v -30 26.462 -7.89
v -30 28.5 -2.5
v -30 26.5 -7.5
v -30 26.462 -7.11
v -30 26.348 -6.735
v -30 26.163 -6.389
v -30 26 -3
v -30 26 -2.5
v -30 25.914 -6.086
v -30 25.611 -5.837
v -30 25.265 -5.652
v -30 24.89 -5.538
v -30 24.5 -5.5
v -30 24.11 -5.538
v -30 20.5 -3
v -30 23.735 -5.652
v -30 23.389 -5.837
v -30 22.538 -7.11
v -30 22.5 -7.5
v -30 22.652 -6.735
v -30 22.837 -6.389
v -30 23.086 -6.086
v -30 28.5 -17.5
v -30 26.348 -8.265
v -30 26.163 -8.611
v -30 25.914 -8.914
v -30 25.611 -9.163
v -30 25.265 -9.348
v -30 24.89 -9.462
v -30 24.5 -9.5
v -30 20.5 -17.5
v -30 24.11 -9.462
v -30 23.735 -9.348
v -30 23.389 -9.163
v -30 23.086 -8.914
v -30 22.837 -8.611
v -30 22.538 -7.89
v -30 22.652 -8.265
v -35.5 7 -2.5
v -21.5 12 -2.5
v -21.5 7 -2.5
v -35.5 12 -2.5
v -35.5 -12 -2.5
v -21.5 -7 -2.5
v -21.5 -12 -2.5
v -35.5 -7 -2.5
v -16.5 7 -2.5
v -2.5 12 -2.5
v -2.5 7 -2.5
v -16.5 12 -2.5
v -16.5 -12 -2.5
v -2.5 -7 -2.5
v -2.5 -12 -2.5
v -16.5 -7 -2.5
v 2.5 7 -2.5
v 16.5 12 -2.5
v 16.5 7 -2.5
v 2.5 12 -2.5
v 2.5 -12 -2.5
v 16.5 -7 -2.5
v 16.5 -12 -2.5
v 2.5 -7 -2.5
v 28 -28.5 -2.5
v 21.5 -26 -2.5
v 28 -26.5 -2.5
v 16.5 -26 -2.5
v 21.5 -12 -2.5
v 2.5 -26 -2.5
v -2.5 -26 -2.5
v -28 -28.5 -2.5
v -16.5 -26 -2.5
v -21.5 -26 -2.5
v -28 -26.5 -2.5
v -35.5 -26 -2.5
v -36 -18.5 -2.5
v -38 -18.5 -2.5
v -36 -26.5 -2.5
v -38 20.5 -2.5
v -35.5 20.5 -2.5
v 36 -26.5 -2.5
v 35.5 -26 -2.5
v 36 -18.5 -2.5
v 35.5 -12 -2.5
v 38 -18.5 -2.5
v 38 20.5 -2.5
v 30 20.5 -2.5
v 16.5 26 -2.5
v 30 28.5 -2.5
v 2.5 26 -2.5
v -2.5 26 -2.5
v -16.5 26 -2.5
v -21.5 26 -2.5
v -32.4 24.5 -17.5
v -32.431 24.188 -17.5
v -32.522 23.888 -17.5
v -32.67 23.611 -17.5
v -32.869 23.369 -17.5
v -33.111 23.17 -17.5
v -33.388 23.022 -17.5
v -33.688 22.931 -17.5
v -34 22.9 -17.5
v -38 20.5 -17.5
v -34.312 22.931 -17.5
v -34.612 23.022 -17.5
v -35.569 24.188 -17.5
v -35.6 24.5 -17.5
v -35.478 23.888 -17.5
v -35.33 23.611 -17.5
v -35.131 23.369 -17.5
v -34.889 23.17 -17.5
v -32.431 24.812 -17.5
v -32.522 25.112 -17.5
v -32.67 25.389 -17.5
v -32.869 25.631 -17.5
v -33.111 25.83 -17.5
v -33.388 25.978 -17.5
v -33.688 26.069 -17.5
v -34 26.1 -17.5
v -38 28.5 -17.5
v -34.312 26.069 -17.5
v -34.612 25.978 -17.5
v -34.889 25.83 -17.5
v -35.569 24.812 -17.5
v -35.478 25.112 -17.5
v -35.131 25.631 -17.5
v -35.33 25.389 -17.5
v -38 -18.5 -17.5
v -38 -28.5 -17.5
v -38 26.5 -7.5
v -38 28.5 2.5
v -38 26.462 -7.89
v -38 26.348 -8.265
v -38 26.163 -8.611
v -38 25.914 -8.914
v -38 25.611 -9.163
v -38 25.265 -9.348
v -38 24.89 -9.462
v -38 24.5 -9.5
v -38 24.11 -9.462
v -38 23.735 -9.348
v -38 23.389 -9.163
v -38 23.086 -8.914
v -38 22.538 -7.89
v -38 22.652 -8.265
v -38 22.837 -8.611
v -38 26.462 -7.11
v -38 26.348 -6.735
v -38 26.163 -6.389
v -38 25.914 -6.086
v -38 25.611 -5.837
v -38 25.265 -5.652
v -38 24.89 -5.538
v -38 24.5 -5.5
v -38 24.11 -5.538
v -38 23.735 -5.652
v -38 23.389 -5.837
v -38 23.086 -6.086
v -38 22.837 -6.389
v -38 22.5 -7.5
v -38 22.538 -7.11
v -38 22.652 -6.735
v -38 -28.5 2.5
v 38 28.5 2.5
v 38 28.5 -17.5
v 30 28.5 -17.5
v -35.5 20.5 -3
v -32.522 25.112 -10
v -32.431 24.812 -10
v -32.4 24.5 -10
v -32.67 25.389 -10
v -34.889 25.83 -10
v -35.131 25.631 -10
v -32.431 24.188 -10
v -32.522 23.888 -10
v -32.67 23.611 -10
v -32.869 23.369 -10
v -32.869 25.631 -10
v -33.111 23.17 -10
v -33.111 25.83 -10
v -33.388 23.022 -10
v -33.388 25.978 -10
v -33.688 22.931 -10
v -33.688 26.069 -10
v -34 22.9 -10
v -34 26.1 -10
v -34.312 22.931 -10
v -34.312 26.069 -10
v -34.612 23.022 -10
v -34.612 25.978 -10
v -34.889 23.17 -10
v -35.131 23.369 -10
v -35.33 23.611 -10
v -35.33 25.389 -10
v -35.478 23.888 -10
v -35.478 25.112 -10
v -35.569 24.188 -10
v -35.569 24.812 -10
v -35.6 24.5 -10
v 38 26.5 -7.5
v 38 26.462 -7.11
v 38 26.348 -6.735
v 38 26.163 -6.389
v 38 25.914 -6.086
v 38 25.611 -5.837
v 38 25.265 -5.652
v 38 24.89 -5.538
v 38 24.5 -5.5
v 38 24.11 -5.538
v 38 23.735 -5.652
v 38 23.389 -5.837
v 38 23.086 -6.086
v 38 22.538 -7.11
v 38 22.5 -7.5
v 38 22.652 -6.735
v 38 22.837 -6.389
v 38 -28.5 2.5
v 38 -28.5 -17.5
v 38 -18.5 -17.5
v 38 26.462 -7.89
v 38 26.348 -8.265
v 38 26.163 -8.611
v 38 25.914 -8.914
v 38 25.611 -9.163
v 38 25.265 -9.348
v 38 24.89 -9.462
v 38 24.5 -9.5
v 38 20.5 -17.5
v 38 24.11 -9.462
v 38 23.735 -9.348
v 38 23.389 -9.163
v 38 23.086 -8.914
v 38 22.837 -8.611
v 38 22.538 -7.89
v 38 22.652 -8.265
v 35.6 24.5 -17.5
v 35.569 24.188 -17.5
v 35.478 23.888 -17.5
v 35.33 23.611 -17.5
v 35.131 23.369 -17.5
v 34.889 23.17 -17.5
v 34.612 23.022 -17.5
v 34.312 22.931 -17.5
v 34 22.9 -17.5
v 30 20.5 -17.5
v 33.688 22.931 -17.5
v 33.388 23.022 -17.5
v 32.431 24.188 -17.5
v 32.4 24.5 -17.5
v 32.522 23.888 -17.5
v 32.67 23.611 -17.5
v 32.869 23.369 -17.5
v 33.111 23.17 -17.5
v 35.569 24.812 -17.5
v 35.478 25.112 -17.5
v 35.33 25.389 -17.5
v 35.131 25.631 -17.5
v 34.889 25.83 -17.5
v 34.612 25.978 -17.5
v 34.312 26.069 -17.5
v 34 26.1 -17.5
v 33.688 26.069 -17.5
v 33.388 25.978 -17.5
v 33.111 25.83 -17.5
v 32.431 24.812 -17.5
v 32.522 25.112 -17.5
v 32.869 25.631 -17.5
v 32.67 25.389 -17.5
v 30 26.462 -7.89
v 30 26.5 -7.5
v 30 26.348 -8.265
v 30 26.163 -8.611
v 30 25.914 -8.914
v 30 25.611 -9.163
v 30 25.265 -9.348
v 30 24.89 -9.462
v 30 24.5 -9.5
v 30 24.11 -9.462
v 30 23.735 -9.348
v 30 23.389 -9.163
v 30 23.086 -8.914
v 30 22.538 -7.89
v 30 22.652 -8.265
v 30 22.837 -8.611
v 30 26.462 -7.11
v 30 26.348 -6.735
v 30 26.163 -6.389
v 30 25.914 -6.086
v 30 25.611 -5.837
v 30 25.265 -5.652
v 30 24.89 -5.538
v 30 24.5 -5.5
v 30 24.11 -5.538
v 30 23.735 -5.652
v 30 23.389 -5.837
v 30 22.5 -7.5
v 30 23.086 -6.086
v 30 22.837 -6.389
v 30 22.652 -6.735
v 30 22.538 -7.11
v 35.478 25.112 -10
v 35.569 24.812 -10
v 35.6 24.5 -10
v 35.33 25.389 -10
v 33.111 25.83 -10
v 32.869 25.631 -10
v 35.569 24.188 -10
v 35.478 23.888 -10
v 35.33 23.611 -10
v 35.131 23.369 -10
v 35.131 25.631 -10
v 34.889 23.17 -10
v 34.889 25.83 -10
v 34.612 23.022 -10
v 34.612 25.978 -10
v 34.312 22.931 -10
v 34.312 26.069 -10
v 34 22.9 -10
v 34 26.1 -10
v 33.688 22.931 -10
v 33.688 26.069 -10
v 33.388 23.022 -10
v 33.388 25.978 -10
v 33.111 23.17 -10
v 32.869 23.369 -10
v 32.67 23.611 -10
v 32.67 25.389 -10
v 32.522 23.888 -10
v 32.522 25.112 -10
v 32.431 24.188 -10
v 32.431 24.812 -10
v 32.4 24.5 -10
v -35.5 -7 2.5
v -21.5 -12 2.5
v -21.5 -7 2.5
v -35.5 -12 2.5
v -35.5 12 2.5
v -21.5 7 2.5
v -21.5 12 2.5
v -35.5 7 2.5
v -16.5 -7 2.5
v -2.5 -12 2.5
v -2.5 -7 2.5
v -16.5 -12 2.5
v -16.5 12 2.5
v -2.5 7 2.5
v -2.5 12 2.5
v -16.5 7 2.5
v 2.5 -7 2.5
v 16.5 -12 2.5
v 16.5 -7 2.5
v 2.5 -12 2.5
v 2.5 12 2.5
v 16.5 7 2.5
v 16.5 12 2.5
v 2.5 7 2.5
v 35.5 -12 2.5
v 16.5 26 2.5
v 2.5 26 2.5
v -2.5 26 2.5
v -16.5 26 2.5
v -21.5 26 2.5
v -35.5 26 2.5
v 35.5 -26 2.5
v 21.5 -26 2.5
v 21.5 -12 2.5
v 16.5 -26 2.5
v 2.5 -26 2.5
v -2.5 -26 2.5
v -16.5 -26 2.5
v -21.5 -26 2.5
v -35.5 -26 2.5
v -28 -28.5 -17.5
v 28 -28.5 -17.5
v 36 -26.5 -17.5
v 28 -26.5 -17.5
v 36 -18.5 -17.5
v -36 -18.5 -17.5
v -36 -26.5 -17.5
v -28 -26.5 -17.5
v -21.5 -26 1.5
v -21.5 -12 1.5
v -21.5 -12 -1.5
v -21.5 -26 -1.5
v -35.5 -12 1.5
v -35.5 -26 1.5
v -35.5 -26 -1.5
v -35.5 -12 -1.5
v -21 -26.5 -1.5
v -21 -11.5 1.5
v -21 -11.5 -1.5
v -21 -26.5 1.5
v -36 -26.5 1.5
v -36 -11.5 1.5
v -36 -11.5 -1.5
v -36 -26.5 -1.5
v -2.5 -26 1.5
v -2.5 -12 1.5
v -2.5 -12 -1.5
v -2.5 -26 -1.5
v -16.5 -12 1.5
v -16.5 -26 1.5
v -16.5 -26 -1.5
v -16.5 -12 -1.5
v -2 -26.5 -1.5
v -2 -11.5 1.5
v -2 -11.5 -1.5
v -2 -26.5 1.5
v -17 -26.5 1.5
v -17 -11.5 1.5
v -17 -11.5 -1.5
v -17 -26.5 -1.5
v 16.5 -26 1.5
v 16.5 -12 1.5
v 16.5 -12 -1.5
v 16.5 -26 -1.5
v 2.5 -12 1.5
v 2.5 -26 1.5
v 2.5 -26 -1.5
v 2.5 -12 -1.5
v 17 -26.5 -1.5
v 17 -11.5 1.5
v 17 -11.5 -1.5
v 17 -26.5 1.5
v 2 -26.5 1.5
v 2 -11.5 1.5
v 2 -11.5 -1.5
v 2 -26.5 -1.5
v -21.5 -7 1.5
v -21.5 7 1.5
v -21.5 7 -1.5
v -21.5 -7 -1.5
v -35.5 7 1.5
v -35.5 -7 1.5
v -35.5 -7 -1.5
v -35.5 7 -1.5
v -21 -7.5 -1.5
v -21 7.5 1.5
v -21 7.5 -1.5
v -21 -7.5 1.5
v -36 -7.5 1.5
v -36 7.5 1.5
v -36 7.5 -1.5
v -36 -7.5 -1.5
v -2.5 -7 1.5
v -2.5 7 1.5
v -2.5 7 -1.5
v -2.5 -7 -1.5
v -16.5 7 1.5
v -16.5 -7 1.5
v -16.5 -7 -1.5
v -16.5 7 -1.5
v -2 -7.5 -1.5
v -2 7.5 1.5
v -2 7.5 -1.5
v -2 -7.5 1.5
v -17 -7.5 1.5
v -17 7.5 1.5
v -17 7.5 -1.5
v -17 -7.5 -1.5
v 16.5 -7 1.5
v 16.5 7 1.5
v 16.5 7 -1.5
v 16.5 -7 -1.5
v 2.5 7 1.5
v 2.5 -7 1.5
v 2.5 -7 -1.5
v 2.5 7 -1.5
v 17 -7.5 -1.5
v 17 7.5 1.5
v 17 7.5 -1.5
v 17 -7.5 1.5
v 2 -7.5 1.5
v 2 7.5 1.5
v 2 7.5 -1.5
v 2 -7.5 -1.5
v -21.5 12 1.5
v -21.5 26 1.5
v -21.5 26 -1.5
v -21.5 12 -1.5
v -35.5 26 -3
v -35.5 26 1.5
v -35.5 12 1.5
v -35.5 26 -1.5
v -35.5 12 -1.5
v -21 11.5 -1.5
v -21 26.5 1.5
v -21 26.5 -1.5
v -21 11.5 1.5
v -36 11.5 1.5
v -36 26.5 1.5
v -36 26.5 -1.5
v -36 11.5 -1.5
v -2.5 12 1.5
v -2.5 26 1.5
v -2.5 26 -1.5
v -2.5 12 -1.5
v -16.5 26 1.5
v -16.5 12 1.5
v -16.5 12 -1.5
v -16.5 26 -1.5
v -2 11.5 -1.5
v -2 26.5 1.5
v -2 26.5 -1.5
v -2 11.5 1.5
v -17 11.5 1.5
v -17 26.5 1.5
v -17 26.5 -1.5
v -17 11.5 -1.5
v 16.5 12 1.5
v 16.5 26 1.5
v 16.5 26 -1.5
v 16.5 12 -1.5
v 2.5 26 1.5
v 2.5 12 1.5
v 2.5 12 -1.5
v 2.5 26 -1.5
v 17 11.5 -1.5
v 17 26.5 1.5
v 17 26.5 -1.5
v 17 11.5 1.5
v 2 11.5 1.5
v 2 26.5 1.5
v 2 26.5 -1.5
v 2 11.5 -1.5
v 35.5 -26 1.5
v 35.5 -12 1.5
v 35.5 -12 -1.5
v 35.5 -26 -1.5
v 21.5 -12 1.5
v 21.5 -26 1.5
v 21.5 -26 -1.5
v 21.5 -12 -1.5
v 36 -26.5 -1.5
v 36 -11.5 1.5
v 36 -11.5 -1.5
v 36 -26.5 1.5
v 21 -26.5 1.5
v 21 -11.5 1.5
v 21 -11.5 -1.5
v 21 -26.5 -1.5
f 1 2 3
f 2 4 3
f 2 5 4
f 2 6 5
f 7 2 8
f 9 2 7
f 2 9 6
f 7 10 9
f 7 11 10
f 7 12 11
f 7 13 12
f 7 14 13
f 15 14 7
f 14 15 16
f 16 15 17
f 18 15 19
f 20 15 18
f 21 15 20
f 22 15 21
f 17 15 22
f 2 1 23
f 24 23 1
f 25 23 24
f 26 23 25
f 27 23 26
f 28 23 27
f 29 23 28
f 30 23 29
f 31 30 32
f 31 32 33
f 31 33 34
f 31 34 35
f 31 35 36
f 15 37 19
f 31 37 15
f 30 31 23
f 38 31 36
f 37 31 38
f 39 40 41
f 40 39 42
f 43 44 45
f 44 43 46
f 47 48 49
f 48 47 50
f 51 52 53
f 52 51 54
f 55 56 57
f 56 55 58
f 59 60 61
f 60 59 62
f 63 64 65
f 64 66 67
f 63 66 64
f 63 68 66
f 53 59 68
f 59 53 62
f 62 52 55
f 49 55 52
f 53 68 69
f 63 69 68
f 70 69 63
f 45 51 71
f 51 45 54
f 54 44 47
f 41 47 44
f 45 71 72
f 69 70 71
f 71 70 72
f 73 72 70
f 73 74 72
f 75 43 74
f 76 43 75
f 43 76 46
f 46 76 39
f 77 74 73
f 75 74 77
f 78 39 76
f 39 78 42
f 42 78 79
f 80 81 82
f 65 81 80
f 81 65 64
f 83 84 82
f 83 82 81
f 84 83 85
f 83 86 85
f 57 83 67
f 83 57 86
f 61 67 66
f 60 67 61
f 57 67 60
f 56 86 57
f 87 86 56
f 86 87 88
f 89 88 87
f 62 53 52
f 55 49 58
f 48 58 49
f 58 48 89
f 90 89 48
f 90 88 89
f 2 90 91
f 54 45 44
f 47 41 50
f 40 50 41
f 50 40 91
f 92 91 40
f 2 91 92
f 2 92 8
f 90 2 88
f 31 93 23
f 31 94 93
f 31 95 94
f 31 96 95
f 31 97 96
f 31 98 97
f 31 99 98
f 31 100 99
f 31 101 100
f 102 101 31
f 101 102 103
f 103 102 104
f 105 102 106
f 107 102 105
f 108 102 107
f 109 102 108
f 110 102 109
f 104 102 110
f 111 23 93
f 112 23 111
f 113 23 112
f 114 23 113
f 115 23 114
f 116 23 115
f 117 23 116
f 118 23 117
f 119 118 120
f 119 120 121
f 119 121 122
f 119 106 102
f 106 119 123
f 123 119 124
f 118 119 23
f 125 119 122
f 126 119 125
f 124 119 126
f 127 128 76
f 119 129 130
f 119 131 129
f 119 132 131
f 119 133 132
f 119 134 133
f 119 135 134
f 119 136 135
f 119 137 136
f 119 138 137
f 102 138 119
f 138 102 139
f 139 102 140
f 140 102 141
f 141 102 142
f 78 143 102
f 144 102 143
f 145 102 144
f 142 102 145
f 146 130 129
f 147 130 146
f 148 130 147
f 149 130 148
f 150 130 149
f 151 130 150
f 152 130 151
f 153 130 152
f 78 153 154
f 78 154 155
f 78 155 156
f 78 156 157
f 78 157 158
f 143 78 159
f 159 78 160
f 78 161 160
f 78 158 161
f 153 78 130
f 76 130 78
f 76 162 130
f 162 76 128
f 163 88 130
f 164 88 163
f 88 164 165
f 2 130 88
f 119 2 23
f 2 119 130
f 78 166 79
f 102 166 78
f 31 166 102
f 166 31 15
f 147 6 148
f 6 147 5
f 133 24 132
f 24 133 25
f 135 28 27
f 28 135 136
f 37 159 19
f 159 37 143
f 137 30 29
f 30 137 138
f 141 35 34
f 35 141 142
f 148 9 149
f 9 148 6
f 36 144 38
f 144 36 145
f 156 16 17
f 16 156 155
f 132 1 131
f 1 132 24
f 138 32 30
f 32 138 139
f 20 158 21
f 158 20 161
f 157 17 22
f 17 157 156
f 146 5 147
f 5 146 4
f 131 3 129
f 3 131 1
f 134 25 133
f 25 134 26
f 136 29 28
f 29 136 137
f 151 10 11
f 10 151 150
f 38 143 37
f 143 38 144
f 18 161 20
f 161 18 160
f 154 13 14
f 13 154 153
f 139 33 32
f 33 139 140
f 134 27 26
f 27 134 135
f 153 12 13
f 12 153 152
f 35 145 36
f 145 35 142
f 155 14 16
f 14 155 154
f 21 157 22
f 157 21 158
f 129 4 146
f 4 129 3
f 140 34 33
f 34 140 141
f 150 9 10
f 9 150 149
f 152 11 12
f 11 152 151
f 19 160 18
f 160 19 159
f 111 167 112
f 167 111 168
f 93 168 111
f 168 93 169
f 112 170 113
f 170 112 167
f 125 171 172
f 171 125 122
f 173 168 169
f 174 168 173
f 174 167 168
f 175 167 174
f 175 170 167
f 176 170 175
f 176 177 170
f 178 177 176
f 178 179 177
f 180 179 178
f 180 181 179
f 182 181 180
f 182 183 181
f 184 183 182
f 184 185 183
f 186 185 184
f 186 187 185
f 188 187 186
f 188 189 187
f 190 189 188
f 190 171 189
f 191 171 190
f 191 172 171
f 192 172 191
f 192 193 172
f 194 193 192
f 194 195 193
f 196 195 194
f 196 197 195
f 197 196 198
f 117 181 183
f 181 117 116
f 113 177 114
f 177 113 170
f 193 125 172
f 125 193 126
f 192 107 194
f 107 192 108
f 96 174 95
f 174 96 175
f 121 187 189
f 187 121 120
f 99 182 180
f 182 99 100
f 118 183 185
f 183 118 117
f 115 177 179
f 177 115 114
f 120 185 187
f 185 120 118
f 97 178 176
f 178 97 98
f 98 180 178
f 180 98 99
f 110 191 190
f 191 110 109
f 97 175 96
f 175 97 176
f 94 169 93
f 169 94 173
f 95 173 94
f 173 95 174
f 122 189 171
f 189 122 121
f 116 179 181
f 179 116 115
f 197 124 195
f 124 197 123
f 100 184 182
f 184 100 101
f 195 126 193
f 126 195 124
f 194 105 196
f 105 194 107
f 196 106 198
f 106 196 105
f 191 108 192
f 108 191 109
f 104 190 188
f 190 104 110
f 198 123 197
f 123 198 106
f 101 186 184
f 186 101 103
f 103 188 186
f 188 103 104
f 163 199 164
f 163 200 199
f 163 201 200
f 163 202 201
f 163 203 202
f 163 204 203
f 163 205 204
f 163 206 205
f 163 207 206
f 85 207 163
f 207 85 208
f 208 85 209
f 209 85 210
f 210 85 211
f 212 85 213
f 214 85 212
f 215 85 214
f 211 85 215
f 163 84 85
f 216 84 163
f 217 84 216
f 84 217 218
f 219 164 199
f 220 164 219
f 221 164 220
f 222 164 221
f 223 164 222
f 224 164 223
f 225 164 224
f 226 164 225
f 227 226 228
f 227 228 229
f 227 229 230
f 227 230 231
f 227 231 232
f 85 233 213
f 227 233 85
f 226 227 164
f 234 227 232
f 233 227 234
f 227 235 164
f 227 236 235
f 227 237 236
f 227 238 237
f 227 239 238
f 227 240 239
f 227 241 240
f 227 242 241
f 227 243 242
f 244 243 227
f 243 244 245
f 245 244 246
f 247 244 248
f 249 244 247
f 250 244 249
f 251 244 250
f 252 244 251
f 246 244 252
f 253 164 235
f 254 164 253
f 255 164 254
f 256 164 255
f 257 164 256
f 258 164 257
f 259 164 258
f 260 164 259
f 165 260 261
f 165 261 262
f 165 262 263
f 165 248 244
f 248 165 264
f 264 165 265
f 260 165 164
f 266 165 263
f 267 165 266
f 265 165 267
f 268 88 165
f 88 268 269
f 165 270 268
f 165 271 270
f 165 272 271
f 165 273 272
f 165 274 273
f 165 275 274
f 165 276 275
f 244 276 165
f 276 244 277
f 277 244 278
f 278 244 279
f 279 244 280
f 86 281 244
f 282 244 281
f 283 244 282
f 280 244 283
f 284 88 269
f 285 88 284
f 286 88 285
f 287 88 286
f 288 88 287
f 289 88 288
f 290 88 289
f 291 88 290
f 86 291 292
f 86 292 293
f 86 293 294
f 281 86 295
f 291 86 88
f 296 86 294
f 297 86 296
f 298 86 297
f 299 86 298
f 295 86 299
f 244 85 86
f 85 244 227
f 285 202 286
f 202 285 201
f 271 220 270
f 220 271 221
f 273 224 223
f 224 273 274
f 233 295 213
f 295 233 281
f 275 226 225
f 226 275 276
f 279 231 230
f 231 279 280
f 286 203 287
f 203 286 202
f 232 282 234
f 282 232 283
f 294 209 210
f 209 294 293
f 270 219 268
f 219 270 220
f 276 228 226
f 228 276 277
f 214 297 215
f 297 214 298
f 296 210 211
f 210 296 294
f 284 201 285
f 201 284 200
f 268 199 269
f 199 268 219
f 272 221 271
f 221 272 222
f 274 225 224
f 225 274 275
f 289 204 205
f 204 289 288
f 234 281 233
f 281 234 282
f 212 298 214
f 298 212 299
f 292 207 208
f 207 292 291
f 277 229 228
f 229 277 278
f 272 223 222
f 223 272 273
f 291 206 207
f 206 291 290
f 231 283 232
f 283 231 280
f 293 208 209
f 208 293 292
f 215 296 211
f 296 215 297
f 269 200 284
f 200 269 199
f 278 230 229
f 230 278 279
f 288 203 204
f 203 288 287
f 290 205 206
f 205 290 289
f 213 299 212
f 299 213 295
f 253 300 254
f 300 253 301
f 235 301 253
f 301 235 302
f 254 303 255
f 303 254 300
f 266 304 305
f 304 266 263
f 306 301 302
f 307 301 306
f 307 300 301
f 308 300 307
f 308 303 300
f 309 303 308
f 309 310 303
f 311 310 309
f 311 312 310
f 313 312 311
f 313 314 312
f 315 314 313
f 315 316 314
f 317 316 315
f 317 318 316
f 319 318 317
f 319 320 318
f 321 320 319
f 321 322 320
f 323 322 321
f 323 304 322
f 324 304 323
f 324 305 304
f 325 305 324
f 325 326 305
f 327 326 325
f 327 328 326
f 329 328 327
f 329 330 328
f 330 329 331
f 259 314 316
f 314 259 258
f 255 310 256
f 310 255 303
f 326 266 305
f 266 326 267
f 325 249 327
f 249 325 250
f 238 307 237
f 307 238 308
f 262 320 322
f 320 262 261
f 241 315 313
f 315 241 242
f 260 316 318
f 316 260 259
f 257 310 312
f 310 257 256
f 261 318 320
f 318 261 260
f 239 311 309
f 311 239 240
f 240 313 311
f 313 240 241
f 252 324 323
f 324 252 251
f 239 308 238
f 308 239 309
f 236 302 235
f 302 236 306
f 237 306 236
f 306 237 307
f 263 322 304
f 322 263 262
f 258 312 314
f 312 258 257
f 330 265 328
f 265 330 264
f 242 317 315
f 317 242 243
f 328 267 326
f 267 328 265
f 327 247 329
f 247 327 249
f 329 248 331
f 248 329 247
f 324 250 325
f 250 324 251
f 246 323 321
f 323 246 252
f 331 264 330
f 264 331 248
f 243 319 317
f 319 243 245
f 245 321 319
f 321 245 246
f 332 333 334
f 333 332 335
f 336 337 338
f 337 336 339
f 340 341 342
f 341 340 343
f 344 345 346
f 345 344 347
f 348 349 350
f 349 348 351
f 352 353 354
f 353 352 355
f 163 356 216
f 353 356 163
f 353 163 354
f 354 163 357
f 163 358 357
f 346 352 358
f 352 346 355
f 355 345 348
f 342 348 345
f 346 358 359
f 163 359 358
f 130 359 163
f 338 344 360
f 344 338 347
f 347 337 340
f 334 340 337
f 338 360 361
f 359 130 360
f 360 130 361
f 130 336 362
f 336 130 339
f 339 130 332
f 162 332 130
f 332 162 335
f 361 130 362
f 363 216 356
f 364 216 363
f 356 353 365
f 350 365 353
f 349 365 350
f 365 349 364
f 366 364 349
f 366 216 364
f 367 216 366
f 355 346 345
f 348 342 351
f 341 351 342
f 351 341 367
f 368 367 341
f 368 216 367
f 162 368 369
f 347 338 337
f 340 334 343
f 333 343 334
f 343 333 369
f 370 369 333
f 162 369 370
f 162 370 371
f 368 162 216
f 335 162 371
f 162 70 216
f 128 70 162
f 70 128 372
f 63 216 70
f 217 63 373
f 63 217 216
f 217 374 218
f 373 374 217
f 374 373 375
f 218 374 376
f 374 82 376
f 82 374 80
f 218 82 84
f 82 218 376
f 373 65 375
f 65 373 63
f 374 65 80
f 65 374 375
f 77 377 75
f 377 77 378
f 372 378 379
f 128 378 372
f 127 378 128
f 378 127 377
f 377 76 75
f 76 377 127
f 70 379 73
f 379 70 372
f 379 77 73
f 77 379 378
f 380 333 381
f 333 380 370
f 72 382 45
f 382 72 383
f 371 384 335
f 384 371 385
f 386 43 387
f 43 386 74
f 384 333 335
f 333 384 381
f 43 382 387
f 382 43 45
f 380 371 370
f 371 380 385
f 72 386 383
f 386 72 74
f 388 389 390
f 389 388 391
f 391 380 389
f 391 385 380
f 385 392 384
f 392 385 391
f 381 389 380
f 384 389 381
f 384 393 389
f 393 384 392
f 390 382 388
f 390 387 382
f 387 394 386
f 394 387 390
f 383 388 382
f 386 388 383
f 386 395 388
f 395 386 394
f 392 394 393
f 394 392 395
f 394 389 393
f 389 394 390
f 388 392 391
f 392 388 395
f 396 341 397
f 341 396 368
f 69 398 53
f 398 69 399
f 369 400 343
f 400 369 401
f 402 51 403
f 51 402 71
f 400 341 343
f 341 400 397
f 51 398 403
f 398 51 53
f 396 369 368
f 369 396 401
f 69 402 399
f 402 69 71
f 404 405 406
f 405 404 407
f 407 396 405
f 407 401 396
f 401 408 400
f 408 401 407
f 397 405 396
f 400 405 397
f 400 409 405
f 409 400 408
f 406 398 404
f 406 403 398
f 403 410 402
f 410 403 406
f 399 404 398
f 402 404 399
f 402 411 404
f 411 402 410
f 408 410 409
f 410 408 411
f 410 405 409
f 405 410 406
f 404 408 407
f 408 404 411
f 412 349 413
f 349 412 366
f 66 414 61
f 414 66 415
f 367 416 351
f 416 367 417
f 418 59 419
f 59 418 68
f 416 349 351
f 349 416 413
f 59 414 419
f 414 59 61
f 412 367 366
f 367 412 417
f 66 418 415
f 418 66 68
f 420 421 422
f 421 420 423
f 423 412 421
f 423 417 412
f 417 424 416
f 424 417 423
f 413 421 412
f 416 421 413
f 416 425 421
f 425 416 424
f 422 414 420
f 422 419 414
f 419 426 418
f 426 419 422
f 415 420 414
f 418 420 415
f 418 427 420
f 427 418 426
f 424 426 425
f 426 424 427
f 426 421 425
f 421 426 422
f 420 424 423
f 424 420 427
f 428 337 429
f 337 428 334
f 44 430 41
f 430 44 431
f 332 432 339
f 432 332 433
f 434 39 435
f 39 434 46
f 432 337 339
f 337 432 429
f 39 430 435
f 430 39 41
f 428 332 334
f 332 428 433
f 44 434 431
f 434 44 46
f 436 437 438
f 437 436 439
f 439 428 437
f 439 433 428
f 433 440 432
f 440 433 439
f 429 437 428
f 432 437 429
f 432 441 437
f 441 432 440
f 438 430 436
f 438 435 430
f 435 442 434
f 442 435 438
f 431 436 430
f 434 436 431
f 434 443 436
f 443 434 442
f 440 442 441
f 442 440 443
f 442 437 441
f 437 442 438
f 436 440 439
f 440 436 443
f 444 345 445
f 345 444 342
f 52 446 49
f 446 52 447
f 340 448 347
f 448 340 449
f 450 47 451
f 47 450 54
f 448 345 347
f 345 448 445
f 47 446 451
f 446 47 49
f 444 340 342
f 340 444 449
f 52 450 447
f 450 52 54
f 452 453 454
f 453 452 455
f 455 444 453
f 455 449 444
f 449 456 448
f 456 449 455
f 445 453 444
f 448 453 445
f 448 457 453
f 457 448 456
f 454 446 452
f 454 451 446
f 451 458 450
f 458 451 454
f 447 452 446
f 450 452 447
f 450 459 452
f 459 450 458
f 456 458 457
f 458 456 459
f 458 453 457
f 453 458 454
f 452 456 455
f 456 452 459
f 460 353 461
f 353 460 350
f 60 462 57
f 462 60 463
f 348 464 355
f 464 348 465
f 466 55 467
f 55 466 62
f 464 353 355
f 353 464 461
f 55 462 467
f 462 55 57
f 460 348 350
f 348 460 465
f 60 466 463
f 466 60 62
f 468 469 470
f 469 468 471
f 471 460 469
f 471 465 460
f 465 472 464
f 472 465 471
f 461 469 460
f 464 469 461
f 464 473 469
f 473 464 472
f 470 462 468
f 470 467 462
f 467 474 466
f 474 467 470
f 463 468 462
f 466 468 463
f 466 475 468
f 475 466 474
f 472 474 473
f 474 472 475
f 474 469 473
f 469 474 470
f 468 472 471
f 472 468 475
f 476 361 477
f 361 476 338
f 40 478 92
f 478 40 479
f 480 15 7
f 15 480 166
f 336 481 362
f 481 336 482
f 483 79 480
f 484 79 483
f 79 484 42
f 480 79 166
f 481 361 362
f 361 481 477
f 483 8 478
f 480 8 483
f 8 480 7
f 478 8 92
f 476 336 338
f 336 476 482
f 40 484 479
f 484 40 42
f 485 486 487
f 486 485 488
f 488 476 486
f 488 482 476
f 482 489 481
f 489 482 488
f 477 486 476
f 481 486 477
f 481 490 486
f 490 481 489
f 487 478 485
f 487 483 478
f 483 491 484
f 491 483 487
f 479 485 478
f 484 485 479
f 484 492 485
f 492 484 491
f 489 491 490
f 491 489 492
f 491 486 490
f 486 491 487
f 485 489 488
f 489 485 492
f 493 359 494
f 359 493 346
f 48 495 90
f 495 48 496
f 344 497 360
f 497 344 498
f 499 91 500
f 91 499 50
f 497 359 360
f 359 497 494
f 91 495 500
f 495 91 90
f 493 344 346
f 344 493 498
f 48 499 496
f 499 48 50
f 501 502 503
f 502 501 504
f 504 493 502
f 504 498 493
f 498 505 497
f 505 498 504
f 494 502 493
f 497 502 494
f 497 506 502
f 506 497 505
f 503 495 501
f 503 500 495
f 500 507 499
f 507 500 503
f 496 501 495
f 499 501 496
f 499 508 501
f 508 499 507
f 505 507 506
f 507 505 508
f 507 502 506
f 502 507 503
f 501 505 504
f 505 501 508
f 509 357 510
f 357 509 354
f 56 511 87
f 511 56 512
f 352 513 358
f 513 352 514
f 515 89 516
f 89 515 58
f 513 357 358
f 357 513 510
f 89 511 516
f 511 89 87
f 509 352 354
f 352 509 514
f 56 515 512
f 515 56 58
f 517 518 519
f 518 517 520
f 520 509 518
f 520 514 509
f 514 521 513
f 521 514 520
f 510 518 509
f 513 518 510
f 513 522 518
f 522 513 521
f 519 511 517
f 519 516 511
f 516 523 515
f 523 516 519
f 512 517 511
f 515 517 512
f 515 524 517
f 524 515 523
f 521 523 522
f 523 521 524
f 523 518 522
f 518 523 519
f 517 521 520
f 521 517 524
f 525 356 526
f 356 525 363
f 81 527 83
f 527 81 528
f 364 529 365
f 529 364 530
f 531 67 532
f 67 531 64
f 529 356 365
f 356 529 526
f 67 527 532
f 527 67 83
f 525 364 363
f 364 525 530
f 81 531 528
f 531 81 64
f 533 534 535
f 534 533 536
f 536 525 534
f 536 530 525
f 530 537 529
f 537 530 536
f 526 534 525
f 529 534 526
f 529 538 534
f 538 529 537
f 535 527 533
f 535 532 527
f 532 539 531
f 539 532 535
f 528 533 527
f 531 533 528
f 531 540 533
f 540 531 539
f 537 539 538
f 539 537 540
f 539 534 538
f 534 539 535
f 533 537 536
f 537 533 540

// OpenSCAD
// file: common.scad
key_size = 14;
stabilizer_size = 3.5;

b_post = 8;
m_post_s = 2;
m_post_l = 10;
post_z = 15;

plat_z = 5;

module keyhole(x, y) {
  translate([x, y, 0]) {
    cube([key_size, key_size, plat_z + 1], center = true);
    cube([key_size + 1, key_size + 1, plat_z - 2], center = true);
  }
}

module double_wide(x, y) {
  keyhole(x, y);
  for (offset=[-12, 12]) {
     translate([x + offset, y - 1, 0]) {
       cube([stabilizer_size, key_size, plat_z + 1], center = true);
       translate([0, key_size/2, 0])
         cube([stabilizer_size, 1, plat_z - 2], center = true);
       translate([0, -key_size/2, 0])
         cube([stabilizer_size, 2, plat_z - 2], center = true);
     }
  }
}

module e_post(x, y, z) {
  translate([x, y, -(plat_z + post_z)/2]) {
    difference() {
      cube([b_post, b_post, post_z], center = true);
      translate([0, 0, -post_z/2]) cylinder(h=post_z, r=1.6, center=true, $fn=32);
    }
  }
}

module e_post_i(x, y, r) {
  translate([x, y, -(plat_z + post_z)/2]) {
    difference() {
      cube([b_post, b_post, post_z], center = true);
      translate([0, 0, post_z/6]) rotate(r) cylinder(h=b_post+1, r=2, center=true, $fn=32);
      translate([0, 0, -post_z/2]) cylinder(h=post_z, r=1.6, center=true, $fn=32);
    }
  }
}

module e_post_x(x, y) {
  e_post_i(x, y, [0, 90, 0]);
}


module e_post_y(x, y) {
  e_post_i(x, y, [90, 0, 0]);
}

module i_post_x(x, y) {
  translate([x, y, -(plat_z + post_z)/2]) cube([m_post_l, m_post_s, post_z], center = true);
}

module i_post_y(x, y) {
  translate([x, y, -(plat_z + post_z)/2]) cube([m_post_s, m_post_l, post_z], center = true);
}
// file: parameters.scad
key_size = 14;
key_sep = 5;
m_key_sep = 13.5;
l_key_sep = 33;

border = 8;
b_post = 8;
m_post_s = 2;
m_post_l = 10;
post_z = 15;

key_cell = key_size + key_sep;
m_key_cell_x = key_size + m_key_sep;
l_key_cell_x = 2*key_cell;

plat_z = 5;
// main file
// Alien bat section 2: top middle left section

include <parameters.scad>

plat_x = 4 * key_cell;
plat_y = 3 * key_cell;

use <common.scad>

difference() {
  union() {
    cube([plat_x, plat_y, 5], center = true);
    e_post_x(-(plat_x-b_post)/2, (plat_y-b_post)/2);
    e_post_x((plat_x-b_post)/2, (plat_y-b_post)/2);

    i_post_y((plat_x-m_post_s)/2, -(plat_y-m_post_l)/2);
    i_post_x((plat_x-m_post_l)/2, -(plat_y-m_post_s)/2);

    i_post_y(-(plat_x-m_post_s)/2, -(plat_y-m_post_l)/2);
    i_post_x(-(plat_x-m_post_l)/2, -(plat_y-m_post_s)/2);
  }
  for (row = [0:2]) {
    for (col = [0:2]) {
      keyhole(-plat_x/2 + key_cell/2 + col * key_cell, -plat_y/2 + row*key_cell + key_cell/2);
    }
  }
  keyhole(plat_x/2 - key_cell/2, -plat_y/2 + key_cell/2);
}
